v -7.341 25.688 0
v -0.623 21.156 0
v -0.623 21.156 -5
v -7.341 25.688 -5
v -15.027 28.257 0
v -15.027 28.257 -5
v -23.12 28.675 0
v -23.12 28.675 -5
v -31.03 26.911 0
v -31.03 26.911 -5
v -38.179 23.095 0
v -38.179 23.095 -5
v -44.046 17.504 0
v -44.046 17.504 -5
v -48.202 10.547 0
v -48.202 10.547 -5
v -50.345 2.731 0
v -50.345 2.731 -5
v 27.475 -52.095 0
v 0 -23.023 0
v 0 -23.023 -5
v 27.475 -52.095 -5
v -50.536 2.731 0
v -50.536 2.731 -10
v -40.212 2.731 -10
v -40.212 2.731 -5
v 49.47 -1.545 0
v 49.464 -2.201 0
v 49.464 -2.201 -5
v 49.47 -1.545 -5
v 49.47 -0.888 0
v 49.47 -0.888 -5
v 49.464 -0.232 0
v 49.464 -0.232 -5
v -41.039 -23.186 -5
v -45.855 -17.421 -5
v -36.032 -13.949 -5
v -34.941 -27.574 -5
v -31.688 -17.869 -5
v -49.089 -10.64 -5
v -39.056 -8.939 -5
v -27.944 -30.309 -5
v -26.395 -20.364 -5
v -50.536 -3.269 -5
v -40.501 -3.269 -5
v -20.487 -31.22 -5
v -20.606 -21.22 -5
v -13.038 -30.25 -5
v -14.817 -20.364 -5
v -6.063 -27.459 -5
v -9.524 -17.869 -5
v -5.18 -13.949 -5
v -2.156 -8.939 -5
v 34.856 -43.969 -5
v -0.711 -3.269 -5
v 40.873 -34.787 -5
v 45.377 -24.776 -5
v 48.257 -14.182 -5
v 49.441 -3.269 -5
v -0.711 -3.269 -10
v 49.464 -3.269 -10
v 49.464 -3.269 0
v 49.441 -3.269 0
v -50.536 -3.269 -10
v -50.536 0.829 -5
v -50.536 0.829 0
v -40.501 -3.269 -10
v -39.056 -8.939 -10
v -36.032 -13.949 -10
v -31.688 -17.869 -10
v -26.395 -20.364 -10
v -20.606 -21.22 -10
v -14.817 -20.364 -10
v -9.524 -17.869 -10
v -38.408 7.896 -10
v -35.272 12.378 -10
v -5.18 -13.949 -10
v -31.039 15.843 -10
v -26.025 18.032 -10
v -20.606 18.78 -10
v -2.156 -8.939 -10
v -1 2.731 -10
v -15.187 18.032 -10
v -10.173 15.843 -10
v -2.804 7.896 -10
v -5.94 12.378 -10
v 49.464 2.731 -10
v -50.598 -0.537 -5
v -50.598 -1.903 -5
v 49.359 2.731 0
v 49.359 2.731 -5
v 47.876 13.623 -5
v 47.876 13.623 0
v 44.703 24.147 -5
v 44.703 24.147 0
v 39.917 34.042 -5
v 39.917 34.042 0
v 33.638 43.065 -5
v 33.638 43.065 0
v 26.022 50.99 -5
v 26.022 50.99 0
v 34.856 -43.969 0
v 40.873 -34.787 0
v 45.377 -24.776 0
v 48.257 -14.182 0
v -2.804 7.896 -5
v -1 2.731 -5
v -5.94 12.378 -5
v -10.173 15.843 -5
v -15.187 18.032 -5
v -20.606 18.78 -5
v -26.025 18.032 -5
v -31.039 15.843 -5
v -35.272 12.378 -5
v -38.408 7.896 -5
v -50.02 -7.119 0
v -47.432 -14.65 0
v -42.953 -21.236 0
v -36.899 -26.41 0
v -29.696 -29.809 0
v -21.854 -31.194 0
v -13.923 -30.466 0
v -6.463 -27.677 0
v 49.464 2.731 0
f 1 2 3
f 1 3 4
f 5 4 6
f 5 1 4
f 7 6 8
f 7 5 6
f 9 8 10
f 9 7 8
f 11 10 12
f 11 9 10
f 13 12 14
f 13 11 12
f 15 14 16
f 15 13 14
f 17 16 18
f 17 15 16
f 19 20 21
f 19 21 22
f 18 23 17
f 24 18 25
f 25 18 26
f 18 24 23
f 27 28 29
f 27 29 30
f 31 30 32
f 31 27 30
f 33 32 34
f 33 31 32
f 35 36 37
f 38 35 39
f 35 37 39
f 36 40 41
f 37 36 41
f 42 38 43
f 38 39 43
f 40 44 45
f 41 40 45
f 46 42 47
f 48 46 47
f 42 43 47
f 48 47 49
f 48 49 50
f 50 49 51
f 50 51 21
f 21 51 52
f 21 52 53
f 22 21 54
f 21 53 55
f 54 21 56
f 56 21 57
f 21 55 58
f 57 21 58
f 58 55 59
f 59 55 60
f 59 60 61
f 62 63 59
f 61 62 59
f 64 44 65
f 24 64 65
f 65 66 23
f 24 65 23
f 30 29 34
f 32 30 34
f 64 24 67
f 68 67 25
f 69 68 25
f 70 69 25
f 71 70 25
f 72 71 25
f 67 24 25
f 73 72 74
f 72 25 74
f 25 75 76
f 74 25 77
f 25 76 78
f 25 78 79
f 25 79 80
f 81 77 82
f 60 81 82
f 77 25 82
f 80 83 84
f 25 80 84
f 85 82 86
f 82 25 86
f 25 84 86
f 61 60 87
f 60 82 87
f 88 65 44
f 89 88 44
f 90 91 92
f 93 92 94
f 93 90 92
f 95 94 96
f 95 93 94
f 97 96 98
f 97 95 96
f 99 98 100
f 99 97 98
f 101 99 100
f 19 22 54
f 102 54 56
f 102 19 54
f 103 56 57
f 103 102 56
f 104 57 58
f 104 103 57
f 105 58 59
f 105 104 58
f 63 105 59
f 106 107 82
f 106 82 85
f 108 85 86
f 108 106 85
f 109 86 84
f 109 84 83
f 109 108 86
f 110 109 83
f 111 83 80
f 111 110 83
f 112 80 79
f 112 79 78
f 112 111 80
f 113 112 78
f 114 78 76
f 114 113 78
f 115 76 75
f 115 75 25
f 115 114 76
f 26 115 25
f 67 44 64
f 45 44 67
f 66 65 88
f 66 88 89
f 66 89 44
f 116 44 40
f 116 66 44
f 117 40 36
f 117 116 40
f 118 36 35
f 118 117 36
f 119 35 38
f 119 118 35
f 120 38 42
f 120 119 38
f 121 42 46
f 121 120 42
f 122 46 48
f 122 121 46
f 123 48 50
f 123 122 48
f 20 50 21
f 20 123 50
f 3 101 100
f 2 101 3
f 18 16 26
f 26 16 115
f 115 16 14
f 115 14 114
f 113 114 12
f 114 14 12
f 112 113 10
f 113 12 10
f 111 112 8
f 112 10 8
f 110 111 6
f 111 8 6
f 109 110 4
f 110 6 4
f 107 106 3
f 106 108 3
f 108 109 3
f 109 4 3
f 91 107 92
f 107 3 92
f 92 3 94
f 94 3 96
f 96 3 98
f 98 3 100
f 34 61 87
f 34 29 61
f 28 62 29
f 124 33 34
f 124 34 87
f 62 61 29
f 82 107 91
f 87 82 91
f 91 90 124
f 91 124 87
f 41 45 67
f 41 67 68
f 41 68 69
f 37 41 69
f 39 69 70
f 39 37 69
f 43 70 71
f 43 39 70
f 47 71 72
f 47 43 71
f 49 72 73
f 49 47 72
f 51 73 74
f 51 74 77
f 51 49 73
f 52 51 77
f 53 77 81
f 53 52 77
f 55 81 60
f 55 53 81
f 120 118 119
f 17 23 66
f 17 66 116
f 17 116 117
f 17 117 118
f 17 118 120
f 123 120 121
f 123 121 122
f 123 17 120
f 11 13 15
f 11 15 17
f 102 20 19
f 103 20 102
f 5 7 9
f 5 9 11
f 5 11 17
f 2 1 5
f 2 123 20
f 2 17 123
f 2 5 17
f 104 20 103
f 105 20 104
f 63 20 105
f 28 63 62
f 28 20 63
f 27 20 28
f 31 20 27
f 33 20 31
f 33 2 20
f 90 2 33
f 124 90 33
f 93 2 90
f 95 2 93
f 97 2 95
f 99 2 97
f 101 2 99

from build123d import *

# Parameters (mm, degrees)
SKETCH3_R           = 20
SKETCH3_W           = 100
SKETCH3_H           = 6
BOSS_EXTRUDE3_DEPTH = 10
SKETCH5_R           = 30
BOSS_EXTRUDE4_DEPTH = 5


with BuildPart() as part:
    # Sketch3 → Boss-Extrude3 (new body)
    with BuildSketch(Plane.XY):
        with Locations((-20.605993479, -1.21989897)):
            Circle(SKETCH3_R)
        with Locations((-0.535964706, -0.268513697)):
            Rectangle(SKETCH3_W, SKETCH3_H)
    extrude(amount=-BOSS_EXTRUDE3_DEPTH)

    # Sketch5 → Boss-Extrude4 (add)
    with BuildSketch(Plane.XY):
        with BuildLine():
            Line((26.021713598, 50.989840857), (-0.622690446, 21.155703813))
            ThreePointArc((-0.622690446, 21.155703813), (6.775561362, 11.037770242), (9.394006521, -1.21989897))
            ThreePointArc((9.394006521, -1.21989897), (6.945592722, -13.090454889), (0, -23.023408613))
            Line((0, -23.023408613), (27.474657971, -52.094754804))
            ThreePointArc((27.474657971, -52.094754804), (49.464035294, -0.232284347), (26.021713598, 50.989840857))
        make_face()
        with Locations((-20.605993479, -1.21989897)):
            Circle(SKETCH5_R)
    extrude(amount=-BOSS_EXTRUDE4_DEPTH)


solid = part.part
